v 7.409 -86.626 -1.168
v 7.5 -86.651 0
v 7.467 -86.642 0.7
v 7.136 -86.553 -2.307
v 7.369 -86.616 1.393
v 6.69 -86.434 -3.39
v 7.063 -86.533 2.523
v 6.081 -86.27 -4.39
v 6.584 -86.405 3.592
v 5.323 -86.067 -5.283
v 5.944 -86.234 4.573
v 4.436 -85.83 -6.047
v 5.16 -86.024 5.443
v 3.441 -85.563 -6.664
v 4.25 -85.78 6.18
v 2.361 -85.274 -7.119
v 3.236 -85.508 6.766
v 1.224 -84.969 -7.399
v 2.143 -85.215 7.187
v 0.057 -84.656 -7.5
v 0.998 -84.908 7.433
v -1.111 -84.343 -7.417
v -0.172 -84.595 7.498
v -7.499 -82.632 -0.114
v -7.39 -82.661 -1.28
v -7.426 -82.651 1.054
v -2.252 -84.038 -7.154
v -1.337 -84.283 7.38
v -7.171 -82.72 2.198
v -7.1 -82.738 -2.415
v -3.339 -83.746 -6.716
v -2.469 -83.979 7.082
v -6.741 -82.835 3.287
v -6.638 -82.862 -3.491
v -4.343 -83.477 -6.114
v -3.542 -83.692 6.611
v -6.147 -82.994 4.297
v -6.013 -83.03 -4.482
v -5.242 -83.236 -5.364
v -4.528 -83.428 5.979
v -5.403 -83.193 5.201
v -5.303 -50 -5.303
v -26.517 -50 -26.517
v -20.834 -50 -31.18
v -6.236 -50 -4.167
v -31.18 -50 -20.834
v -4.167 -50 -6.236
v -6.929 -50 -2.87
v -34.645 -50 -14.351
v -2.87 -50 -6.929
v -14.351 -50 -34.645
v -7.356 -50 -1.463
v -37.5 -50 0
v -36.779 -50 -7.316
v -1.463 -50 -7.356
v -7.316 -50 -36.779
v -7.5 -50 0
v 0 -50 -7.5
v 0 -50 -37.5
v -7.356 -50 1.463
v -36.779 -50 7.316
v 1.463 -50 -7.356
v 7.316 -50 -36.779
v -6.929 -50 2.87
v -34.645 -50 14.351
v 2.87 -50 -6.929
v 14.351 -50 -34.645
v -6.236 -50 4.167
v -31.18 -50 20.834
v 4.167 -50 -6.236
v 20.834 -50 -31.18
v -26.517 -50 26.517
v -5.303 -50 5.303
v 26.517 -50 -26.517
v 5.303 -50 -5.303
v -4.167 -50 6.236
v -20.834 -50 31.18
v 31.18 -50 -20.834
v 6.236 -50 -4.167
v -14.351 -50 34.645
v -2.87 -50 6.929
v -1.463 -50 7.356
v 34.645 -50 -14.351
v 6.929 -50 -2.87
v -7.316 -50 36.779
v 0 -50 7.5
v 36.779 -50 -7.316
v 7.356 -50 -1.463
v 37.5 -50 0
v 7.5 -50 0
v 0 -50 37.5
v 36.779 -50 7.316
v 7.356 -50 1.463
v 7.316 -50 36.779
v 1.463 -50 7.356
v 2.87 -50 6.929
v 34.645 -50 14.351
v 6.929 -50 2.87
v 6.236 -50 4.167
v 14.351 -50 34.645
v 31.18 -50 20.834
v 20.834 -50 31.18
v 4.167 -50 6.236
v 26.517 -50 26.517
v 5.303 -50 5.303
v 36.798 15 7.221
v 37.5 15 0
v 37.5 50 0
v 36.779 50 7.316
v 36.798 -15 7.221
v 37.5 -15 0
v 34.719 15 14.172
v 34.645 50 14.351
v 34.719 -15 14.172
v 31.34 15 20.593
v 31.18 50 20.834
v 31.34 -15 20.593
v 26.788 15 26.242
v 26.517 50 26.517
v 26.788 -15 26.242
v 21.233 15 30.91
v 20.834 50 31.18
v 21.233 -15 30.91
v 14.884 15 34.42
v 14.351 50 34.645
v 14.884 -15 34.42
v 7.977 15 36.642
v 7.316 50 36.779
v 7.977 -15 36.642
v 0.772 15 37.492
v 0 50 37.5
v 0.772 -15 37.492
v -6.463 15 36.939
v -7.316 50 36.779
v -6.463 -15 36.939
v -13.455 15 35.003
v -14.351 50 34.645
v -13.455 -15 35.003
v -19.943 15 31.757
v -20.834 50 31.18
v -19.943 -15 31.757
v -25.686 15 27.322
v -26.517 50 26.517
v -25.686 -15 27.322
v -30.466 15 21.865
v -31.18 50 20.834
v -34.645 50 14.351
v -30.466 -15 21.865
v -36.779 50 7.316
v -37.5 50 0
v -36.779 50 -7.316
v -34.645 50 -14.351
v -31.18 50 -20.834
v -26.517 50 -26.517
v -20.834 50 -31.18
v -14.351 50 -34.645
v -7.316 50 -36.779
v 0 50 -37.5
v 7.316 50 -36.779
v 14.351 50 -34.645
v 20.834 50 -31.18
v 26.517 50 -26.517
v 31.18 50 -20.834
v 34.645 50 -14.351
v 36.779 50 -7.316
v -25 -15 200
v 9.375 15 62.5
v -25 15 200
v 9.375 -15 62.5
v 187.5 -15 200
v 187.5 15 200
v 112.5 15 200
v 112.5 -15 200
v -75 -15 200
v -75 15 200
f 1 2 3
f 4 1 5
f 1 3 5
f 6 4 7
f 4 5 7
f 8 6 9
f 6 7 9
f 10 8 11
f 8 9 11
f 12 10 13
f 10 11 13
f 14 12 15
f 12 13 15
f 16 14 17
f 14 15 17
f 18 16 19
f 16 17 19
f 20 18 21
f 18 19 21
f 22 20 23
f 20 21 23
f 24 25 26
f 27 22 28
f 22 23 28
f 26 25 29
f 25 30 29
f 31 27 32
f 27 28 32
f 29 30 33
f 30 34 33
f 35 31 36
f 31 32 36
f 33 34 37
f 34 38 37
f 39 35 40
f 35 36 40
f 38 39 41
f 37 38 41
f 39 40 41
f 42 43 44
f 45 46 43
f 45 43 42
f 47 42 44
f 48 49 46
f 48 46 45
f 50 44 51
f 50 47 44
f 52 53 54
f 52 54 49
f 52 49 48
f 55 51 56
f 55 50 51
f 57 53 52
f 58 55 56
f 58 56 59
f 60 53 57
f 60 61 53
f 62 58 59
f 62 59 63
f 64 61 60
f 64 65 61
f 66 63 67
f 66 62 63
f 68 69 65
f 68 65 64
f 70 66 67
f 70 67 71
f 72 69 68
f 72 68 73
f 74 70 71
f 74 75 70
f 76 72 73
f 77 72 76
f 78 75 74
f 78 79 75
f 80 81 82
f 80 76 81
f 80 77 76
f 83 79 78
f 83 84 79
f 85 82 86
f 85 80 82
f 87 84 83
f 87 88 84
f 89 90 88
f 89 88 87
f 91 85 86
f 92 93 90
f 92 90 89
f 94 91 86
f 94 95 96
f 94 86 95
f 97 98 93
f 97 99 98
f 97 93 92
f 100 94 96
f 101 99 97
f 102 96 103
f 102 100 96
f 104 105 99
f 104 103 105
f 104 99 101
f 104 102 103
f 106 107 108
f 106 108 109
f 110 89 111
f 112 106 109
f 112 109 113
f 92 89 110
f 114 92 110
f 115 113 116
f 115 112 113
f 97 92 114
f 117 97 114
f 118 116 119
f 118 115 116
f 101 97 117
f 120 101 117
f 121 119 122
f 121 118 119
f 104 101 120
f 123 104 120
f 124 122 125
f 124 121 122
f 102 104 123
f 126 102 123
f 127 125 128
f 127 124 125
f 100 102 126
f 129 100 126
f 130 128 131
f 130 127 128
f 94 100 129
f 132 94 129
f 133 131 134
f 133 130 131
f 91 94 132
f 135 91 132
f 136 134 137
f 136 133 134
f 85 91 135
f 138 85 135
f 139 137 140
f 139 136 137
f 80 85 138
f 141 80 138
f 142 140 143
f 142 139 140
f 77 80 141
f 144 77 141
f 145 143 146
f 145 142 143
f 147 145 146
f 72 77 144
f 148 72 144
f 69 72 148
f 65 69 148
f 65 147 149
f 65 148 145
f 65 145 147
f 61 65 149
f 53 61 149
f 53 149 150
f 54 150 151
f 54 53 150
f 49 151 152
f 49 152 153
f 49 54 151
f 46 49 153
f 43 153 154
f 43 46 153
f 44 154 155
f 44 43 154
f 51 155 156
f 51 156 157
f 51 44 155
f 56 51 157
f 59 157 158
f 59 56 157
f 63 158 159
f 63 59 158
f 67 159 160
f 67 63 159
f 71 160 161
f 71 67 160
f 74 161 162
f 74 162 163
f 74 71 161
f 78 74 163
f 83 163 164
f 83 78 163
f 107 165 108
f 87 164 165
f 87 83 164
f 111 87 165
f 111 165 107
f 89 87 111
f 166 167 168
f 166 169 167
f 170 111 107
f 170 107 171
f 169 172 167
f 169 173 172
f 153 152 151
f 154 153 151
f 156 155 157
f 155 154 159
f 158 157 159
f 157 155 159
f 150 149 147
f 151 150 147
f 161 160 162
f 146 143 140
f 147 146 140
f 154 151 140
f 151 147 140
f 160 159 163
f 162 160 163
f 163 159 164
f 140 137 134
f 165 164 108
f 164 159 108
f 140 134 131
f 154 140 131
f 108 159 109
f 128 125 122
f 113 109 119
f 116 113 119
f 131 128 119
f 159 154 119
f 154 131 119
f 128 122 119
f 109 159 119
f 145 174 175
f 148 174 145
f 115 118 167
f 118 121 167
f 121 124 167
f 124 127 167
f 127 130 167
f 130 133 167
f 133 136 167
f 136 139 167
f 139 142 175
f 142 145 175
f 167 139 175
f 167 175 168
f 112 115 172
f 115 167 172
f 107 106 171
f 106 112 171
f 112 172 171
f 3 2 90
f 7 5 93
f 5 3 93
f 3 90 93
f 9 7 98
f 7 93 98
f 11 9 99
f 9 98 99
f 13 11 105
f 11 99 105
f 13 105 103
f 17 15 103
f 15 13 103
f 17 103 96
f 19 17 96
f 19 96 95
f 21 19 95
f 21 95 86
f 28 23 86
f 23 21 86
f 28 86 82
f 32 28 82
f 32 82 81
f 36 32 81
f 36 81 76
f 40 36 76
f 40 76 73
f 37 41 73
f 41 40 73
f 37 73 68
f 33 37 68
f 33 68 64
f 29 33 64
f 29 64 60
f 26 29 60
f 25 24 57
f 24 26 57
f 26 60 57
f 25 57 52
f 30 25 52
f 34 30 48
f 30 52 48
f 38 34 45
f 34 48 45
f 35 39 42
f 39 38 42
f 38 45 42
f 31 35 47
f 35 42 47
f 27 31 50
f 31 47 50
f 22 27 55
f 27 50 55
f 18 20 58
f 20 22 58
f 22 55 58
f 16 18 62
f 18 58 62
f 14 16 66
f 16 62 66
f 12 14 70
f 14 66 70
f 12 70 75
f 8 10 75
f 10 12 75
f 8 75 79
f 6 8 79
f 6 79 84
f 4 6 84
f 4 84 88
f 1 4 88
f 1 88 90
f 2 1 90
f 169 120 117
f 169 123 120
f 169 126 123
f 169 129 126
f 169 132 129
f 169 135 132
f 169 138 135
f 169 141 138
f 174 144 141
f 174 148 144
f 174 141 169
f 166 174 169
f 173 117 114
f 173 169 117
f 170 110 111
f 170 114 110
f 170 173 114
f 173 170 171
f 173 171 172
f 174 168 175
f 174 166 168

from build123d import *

# Parameters (mm, degrees)
F1_DEPTH = 15
F2_R     = 37.5
F3_DEPTH = 50
F4_R     = 7.5
F5_DEPTH = 40
F7_DEPTH = 50


with BuildPart() as f1:
    # F0 (on Front) → F1 (new body, symmetric)
    with BuildSketch(Plane.XZ):
        Polygon((-25, 200), (-75, 200), (-17.5, -30), (15, -30), (187.5, 200), (112.5, 200), (9.375, 62.5), align=None)
    extrude(amount=F1_DEPTH, both=True)

    # F2 (on Front) → F3 (join, symmetric)
    with BuildSketch(Plane.XZ):
        Circle(F2_R)
    extrude(amount=F3_DEPTH, both=True)

    # F4 (on face) → F5 (join)
    with BuildSketch(Plane.XZ.offset(50)):
        Circle(F4_R)
    extrude(amount=F5_DEPTH)

    # F6 (on Top) → F7 (cut, symmetric)
    with BuildSketch(Plane.XY):
        Polygon((-20, -79.282032), (-20, -90), (20, -90), align=None)
    extrude(amount=F7_DEPTH, both=True, mode=Mode.SUBTRACT)


solid = f1.part
